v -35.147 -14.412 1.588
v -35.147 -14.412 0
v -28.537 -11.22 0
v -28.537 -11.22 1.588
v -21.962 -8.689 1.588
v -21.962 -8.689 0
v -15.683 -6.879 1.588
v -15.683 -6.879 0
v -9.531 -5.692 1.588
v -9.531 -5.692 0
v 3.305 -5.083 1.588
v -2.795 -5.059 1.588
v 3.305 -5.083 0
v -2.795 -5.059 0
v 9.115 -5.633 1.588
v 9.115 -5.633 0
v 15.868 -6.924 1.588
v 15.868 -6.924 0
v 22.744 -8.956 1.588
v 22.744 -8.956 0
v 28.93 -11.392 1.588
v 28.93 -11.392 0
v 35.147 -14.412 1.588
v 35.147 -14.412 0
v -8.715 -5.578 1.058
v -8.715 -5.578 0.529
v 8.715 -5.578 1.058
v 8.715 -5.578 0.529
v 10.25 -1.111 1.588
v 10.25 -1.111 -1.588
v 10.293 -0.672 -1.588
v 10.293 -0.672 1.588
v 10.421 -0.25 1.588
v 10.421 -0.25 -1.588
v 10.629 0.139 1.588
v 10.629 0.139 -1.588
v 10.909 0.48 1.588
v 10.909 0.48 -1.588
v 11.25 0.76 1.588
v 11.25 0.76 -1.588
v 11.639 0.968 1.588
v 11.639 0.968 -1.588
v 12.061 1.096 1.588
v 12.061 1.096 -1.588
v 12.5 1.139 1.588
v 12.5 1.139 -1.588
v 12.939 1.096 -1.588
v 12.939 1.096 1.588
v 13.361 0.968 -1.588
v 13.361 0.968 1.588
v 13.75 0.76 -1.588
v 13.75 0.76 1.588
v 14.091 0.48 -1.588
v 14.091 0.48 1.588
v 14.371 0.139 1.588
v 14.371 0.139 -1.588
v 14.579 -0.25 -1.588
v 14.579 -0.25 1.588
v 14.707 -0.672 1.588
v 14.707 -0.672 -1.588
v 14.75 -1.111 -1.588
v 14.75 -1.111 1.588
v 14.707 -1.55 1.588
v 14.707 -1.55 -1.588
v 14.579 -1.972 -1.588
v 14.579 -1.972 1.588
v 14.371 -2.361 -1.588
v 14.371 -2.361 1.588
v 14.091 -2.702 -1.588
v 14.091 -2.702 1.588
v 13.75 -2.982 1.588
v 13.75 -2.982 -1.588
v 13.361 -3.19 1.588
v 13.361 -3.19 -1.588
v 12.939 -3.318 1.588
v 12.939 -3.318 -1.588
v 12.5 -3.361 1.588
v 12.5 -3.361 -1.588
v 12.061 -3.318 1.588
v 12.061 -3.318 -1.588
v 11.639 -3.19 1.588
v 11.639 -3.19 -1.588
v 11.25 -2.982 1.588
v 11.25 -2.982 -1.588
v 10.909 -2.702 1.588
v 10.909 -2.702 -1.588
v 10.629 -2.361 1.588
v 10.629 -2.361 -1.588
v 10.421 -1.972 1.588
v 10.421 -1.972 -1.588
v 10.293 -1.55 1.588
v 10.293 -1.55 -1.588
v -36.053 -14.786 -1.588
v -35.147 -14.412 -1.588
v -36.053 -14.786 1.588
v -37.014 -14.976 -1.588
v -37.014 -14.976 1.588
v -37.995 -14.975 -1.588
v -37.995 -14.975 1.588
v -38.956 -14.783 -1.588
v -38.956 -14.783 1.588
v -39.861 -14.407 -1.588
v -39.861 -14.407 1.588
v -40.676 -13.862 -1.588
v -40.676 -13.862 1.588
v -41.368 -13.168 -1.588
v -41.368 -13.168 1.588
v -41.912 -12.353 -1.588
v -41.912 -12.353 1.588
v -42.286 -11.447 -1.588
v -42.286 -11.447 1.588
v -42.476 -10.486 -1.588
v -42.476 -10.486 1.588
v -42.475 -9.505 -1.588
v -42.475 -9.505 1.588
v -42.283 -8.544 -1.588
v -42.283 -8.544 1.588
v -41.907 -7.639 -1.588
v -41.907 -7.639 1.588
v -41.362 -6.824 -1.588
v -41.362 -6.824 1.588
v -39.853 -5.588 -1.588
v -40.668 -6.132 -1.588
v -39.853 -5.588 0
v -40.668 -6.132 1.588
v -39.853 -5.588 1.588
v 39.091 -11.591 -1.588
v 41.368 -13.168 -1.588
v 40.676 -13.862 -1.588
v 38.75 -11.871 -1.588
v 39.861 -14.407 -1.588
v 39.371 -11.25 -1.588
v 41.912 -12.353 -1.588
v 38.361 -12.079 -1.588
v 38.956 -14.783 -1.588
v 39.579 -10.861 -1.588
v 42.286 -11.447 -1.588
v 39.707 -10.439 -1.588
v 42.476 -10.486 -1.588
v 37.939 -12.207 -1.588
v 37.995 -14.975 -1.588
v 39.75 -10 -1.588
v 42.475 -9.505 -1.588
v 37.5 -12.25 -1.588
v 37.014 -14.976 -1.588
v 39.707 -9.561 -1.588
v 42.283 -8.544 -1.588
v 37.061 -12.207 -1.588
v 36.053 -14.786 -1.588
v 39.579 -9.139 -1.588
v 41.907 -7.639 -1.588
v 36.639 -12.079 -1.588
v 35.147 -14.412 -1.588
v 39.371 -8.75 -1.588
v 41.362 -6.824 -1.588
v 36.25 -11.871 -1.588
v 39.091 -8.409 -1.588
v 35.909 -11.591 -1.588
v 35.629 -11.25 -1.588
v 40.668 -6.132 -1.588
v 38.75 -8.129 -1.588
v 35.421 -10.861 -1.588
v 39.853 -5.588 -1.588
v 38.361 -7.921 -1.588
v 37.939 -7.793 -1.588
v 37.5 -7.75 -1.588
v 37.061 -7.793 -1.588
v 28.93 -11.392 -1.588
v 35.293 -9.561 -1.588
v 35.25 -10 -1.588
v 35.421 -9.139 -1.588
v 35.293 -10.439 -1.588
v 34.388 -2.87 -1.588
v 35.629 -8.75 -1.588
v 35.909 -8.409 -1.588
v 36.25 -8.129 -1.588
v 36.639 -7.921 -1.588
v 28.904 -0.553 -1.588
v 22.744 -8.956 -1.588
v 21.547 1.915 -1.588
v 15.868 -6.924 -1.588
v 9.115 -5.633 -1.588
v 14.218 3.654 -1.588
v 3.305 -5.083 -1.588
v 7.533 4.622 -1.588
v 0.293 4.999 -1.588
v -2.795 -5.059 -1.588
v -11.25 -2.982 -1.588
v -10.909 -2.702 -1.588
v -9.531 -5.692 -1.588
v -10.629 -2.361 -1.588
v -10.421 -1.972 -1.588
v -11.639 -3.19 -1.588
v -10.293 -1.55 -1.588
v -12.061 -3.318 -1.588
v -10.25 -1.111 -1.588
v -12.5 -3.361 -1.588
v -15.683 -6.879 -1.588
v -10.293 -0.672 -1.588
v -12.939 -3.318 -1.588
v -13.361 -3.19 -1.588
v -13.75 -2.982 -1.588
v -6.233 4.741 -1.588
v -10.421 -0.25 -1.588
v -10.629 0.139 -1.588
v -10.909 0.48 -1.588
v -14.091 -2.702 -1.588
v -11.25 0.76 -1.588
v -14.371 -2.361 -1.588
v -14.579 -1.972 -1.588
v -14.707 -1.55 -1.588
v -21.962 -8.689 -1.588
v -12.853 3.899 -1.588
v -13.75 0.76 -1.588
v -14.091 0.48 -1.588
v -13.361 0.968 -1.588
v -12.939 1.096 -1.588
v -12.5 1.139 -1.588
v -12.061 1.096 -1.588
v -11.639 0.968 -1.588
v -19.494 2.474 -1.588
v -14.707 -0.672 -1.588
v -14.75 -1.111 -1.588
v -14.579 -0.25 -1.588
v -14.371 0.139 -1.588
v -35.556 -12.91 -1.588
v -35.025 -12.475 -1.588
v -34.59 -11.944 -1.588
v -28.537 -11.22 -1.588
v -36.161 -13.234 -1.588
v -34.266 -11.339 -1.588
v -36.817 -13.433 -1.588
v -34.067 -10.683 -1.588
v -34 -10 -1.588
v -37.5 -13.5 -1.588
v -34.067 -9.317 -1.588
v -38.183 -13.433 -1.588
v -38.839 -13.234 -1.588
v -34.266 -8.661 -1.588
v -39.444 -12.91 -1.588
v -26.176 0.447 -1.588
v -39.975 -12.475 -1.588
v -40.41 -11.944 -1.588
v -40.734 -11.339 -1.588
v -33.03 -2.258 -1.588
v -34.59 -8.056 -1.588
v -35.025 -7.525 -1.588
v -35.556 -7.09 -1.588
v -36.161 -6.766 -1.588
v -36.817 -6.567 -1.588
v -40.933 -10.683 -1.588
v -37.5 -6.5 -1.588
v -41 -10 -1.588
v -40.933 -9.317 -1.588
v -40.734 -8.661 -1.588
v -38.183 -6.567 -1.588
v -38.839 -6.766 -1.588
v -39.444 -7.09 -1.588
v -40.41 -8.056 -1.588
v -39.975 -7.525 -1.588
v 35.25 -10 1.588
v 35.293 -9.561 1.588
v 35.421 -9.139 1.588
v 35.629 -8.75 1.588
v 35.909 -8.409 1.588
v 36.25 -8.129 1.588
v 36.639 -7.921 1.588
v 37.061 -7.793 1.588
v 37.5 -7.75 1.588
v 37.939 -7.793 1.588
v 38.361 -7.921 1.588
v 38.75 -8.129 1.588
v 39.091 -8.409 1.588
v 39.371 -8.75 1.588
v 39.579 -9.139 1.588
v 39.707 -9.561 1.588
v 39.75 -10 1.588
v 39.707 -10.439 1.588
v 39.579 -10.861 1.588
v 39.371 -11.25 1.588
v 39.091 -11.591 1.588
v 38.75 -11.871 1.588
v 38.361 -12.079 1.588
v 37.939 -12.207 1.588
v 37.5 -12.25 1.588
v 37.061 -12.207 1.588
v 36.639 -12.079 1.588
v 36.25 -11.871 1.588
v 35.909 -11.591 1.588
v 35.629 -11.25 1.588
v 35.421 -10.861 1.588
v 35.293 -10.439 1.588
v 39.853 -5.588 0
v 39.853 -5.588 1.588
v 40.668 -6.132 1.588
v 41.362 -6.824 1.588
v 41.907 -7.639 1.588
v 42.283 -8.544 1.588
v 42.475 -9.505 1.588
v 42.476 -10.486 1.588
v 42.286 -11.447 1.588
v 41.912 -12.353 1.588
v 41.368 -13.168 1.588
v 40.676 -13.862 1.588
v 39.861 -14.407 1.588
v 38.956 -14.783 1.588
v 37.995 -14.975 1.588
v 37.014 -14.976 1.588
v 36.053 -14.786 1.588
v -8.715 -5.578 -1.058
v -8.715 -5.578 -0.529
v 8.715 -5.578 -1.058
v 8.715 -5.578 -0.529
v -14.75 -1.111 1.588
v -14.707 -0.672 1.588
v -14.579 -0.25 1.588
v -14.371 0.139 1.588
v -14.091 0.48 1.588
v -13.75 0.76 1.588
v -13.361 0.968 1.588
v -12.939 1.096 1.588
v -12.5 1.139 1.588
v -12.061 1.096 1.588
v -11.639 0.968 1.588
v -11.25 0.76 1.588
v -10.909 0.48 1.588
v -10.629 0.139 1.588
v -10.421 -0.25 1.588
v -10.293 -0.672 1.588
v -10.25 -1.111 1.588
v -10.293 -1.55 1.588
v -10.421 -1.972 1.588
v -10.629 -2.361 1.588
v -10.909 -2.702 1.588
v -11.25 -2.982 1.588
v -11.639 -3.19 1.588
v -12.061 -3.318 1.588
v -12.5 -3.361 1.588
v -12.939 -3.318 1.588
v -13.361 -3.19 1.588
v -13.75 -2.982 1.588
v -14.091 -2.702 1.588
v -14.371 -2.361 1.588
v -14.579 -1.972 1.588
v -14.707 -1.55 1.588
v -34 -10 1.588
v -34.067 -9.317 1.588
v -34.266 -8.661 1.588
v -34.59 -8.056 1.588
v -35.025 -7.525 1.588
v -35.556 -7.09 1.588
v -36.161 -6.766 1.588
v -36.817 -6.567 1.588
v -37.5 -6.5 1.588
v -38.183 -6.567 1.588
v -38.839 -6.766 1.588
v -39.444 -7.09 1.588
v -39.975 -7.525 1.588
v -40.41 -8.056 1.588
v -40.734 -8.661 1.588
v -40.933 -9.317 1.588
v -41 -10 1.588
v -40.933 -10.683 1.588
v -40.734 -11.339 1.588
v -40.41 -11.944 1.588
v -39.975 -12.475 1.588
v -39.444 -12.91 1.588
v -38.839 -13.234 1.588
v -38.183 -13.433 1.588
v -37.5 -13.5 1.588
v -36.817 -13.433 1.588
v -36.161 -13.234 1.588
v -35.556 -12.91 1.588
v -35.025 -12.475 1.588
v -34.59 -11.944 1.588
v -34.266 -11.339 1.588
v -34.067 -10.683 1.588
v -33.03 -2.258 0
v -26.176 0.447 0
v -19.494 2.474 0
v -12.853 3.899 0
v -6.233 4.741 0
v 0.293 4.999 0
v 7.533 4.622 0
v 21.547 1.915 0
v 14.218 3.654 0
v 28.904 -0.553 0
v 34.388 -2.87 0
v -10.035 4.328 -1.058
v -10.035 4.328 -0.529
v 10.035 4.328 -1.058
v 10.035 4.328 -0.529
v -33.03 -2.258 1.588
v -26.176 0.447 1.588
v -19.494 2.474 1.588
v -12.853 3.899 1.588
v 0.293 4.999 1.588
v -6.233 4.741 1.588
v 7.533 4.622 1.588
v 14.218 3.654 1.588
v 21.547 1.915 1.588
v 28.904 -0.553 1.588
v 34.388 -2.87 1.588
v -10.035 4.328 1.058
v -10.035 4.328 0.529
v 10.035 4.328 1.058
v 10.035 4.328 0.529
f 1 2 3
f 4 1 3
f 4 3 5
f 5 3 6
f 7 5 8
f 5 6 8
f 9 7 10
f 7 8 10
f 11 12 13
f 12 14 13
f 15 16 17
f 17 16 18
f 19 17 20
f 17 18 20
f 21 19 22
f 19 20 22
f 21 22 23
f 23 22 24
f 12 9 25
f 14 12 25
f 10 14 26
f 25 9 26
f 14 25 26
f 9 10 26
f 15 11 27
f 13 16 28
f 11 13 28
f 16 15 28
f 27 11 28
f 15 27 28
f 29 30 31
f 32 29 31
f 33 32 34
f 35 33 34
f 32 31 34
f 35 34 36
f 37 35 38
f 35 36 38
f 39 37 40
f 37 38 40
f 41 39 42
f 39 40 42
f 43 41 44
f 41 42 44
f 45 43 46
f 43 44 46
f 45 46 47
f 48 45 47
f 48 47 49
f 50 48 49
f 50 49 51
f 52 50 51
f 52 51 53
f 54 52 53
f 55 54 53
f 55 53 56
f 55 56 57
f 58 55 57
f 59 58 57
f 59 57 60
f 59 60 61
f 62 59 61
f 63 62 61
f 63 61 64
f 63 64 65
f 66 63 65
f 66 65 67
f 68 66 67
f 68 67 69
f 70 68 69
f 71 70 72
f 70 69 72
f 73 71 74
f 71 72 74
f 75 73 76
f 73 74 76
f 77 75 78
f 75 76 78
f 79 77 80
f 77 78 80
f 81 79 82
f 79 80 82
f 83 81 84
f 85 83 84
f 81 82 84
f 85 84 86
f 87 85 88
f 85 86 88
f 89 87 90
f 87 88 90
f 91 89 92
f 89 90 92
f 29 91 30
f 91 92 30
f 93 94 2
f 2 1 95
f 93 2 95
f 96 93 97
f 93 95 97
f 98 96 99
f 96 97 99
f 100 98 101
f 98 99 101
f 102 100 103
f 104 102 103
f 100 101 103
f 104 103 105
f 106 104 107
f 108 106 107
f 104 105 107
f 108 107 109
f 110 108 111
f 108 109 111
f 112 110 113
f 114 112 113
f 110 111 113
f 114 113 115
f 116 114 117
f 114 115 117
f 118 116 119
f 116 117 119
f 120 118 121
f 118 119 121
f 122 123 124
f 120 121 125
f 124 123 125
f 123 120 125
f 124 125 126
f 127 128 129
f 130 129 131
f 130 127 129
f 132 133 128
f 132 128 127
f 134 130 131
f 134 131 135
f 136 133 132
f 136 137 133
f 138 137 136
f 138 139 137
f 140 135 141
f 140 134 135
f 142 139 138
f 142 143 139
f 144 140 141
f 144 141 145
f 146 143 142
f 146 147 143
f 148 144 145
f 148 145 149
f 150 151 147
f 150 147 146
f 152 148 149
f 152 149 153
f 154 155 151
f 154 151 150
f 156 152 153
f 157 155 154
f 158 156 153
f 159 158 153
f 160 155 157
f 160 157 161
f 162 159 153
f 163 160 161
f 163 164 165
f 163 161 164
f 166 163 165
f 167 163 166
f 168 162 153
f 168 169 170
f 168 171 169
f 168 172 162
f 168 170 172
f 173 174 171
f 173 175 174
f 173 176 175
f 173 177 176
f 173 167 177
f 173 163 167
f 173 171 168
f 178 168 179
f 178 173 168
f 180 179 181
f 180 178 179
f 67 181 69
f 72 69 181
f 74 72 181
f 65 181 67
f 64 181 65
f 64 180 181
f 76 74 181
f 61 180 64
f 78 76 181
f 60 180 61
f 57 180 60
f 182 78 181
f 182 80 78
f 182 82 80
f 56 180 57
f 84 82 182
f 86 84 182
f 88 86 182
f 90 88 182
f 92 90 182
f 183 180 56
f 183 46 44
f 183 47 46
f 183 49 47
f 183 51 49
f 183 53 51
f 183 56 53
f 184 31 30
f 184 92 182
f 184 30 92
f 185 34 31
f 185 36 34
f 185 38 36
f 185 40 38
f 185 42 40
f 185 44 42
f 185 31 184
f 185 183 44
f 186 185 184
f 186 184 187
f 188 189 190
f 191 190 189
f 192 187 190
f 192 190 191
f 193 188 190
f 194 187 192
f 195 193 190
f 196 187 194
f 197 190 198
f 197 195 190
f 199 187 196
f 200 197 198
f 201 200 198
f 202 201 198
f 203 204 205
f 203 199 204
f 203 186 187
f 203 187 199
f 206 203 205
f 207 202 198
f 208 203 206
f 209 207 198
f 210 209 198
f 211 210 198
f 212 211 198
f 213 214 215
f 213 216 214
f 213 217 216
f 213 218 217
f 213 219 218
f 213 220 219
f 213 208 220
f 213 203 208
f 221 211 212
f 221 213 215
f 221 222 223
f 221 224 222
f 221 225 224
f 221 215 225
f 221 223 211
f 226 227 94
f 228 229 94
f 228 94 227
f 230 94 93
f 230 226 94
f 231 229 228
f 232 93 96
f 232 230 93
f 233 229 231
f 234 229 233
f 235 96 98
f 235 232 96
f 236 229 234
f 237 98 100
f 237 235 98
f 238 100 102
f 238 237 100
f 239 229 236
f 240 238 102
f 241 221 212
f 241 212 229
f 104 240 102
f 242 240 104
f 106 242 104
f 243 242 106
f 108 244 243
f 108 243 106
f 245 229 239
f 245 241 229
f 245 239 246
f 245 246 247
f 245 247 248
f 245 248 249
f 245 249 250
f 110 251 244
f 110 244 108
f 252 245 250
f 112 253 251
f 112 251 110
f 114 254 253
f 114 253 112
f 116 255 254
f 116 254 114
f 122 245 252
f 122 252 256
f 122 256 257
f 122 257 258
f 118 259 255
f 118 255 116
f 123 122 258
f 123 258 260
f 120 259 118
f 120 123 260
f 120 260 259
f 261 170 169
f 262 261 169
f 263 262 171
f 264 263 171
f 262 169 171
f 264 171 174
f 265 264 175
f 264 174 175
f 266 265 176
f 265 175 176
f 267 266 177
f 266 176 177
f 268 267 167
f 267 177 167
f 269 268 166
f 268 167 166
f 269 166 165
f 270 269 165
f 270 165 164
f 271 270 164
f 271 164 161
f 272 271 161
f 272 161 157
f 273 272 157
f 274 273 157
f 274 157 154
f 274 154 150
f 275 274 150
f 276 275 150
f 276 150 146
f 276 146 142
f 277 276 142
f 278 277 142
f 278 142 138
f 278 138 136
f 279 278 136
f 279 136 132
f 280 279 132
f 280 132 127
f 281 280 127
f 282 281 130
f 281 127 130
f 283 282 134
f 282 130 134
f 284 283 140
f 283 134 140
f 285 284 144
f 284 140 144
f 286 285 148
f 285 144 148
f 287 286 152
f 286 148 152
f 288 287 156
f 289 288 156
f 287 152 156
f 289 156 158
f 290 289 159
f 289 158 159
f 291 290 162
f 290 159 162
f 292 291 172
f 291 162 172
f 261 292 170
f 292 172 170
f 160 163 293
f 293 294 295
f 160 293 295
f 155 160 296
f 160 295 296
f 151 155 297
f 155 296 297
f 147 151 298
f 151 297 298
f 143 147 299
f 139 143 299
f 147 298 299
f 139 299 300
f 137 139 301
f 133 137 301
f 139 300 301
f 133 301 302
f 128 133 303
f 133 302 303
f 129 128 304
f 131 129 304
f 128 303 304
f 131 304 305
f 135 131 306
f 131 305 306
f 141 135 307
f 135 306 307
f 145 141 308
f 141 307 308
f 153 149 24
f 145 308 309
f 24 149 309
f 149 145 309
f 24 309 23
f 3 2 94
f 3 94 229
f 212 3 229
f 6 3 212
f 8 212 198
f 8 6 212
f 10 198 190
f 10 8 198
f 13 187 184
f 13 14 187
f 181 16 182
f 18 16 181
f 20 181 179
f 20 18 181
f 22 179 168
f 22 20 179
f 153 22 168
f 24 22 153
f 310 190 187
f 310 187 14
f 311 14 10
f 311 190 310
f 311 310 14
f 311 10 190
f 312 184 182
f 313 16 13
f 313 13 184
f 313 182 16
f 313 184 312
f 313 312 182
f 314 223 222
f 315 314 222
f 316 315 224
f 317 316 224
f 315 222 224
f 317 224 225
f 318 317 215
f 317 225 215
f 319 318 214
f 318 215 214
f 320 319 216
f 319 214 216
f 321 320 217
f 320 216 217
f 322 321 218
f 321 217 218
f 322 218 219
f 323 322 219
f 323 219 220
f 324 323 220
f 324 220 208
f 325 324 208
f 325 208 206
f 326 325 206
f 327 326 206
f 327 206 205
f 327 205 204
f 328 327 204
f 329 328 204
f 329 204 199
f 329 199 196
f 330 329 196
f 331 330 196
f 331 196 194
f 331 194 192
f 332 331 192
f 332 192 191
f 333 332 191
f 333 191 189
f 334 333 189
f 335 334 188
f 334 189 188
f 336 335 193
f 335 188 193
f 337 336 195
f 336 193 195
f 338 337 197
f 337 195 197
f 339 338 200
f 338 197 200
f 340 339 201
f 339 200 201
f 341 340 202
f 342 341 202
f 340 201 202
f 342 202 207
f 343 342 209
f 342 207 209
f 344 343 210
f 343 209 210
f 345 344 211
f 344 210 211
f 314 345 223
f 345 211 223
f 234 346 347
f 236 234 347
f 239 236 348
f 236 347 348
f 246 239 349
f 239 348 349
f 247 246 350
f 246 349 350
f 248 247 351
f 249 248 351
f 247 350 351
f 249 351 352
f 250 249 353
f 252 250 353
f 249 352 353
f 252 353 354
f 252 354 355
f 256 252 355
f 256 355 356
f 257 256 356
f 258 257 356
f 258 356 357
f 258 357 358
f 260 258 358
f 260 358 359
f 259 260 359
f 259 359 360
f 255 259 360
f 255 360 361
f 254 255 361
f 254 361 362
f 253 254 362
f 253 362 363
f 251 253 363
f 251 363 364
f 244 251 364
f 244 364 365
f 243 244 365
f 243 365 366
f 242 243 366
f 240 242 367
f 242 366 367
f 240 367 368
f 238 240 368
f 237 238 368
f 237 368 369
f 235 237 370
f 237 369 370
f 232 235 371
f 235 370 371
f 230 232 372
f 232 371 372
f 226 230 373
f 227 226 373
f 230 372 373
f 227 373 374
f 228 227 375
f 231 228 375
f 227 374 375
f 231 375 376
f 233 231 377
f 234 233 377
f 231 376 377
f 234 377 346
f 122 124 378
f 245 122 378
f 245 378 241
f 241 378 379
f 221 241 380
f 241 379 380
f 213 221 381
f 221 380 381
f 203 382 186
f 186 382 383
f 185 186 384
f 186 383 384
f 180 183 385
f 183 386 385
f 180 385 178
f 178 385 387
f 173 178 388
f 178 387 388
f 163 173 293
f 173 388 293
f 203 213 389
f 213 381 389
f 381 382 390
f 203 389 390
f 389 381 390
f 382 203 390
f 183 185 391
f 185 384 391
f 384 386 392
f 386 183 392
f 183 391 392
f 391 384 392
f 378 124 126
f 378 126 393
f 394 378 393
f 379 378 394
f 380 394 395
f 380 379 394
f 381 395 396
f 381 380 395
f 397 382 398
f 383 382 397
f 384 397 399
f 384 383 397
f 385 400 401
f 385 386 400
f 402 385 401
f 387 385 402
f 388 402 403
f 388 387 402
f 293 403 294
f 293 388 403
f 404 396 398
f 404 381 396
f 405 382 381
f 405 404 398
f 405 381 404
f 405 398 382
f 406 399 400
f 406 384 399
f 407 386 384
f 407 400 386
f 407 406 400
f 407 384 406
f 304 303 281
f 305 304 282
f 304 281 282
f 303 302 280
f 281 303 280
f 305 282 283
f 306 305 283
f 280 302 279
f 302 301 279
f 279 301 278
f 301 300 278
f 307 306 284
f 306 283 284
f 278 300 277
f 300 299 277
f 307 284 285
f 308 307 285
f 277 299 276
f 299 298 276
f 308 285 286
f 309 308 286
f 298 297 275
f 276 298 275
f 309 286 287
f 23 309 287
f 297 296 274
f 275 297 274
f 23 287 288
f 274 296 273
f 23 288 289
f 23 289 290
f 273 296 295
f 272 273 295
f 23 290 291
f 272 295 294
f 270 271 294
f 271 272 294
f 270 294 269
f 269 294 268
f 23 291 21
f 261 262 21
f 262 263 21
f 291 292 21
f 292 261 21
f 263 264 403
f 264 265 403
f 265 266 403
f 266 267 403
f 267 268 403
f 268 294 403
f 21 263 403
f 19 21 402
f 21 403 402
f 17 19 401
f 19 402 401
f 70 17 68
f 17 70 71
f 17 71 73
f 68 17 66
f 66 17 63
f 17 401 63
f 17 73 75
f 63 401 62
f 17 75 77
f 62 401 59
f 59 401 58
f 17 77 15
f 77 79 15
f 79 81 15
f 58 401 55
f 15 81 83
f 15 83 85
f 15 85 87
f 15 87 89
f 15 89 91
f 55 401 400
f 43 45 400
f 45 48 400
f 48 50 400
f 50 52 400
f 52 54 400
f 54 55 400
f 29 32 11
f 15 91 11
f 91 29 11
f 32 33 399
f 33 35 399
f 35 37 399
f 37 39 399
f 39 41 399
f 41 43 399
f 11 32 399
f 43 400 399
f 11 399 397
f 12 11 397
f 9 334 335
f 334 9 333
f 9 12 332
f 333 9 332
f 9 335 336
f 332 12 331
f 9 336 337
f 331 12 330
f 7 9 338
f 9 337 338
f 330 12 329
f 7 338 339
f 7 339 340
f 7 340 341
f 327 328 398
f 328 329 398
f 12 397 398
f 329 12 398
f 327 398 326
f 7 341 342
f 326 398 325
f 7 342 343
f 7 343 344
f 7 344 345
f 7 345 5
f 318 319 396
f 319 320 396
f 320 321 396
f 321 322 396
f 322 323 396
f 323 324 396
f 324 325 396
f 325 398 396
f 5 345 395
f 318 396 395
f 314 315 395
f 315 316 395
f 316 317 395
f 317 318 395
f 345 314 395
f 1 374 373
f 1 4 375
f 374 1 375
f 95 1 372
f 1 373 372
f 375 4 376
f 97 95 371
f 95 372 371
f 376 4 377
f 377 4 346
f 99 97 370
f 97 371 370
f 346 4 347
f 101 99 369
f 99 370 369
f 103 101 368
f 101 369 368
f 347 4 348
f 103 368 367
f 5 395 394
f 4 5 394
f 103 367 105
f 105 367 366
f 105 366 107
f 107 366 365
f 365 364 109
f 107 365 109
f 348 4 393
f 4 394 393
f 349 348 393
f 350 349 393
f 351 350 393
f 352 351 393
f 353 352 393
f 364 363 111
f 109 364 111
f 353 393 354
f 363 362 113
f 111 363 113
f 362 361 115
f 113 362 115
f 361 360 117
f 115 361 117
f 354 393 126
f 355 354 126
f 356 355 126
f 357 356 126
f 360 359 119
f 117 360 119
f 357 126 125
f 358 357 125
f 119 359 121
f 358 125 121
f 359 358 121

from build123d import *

# Parameters (mm, degrees)
BOSS_EXTRUDE1_DEPTH  = 1.5875
M4_CLEARANCE_HOLE1_D = 4.5
SKETCH5_R            = 3.5
CUT_EXTRUDE1_DEPTH   = 4.1750001


with BuildPart() as part:
    # Sketch1 → Boss-Extrude1 (new body, symmetric)
    with BuildSketch(Plane.XY):
        with BuildLine():
            ThreePointArc((-35.147058824, -14.411764706), (-41.911764706, -12.352941176), (-39.852941176, -5.588235294))
            add(Edge.make_bspline(
                [(-39.852941176, -5.588235294), (-25.087835375, 2.313761515), (0, 5.671559621), (25.087835375, 2.313761515), (39.852941176, -5.588235294)],
                knots=[0, 0, 0, 0.375, 0.625, 1, 1, 1], degree=2))
            ThreePointArc((39.852941176, -5.588235294), (41.911764706, -12.352941176), (35.147058824, -14.411764706))
            add(Edge.make_bspline(
                [(-35.147058824, -14.411764706), (-21.787164625, -7.313761515), (0, -4.421559621), (21.787164625, -7.313761515), (35.147058824, -14.411764706)],
                knots=[0, 0, 0, 0.375, 0.625, 1, 1, 1], degree=2))
        make_face()
    extrude(amount=BOSS_EXTRUDE1_DEPTH, both=True)

    # M4 Clearance Hole1 (through all)
    with Locations(Plane.XY.offset(1.5875)):
        with Locations((37.5, -10), (-12.5, -1.111111111), (12.5, -1.111111111)):
            Hole(M4_CLEARANCE_HOLE1_D / 2)

    # Sketch5 → Cut-Extrude1 (cut, through all)
    with BuildSketch(Plane.XY.offset(1.5875)):
        with Locations((-37.5, -10)):
            Circle(SKETCH5_R)
    extrude(amount=-CUT_EXTRUDE1_DEPTH, mode=Mode.SUBTRACT)


solid = part.part
